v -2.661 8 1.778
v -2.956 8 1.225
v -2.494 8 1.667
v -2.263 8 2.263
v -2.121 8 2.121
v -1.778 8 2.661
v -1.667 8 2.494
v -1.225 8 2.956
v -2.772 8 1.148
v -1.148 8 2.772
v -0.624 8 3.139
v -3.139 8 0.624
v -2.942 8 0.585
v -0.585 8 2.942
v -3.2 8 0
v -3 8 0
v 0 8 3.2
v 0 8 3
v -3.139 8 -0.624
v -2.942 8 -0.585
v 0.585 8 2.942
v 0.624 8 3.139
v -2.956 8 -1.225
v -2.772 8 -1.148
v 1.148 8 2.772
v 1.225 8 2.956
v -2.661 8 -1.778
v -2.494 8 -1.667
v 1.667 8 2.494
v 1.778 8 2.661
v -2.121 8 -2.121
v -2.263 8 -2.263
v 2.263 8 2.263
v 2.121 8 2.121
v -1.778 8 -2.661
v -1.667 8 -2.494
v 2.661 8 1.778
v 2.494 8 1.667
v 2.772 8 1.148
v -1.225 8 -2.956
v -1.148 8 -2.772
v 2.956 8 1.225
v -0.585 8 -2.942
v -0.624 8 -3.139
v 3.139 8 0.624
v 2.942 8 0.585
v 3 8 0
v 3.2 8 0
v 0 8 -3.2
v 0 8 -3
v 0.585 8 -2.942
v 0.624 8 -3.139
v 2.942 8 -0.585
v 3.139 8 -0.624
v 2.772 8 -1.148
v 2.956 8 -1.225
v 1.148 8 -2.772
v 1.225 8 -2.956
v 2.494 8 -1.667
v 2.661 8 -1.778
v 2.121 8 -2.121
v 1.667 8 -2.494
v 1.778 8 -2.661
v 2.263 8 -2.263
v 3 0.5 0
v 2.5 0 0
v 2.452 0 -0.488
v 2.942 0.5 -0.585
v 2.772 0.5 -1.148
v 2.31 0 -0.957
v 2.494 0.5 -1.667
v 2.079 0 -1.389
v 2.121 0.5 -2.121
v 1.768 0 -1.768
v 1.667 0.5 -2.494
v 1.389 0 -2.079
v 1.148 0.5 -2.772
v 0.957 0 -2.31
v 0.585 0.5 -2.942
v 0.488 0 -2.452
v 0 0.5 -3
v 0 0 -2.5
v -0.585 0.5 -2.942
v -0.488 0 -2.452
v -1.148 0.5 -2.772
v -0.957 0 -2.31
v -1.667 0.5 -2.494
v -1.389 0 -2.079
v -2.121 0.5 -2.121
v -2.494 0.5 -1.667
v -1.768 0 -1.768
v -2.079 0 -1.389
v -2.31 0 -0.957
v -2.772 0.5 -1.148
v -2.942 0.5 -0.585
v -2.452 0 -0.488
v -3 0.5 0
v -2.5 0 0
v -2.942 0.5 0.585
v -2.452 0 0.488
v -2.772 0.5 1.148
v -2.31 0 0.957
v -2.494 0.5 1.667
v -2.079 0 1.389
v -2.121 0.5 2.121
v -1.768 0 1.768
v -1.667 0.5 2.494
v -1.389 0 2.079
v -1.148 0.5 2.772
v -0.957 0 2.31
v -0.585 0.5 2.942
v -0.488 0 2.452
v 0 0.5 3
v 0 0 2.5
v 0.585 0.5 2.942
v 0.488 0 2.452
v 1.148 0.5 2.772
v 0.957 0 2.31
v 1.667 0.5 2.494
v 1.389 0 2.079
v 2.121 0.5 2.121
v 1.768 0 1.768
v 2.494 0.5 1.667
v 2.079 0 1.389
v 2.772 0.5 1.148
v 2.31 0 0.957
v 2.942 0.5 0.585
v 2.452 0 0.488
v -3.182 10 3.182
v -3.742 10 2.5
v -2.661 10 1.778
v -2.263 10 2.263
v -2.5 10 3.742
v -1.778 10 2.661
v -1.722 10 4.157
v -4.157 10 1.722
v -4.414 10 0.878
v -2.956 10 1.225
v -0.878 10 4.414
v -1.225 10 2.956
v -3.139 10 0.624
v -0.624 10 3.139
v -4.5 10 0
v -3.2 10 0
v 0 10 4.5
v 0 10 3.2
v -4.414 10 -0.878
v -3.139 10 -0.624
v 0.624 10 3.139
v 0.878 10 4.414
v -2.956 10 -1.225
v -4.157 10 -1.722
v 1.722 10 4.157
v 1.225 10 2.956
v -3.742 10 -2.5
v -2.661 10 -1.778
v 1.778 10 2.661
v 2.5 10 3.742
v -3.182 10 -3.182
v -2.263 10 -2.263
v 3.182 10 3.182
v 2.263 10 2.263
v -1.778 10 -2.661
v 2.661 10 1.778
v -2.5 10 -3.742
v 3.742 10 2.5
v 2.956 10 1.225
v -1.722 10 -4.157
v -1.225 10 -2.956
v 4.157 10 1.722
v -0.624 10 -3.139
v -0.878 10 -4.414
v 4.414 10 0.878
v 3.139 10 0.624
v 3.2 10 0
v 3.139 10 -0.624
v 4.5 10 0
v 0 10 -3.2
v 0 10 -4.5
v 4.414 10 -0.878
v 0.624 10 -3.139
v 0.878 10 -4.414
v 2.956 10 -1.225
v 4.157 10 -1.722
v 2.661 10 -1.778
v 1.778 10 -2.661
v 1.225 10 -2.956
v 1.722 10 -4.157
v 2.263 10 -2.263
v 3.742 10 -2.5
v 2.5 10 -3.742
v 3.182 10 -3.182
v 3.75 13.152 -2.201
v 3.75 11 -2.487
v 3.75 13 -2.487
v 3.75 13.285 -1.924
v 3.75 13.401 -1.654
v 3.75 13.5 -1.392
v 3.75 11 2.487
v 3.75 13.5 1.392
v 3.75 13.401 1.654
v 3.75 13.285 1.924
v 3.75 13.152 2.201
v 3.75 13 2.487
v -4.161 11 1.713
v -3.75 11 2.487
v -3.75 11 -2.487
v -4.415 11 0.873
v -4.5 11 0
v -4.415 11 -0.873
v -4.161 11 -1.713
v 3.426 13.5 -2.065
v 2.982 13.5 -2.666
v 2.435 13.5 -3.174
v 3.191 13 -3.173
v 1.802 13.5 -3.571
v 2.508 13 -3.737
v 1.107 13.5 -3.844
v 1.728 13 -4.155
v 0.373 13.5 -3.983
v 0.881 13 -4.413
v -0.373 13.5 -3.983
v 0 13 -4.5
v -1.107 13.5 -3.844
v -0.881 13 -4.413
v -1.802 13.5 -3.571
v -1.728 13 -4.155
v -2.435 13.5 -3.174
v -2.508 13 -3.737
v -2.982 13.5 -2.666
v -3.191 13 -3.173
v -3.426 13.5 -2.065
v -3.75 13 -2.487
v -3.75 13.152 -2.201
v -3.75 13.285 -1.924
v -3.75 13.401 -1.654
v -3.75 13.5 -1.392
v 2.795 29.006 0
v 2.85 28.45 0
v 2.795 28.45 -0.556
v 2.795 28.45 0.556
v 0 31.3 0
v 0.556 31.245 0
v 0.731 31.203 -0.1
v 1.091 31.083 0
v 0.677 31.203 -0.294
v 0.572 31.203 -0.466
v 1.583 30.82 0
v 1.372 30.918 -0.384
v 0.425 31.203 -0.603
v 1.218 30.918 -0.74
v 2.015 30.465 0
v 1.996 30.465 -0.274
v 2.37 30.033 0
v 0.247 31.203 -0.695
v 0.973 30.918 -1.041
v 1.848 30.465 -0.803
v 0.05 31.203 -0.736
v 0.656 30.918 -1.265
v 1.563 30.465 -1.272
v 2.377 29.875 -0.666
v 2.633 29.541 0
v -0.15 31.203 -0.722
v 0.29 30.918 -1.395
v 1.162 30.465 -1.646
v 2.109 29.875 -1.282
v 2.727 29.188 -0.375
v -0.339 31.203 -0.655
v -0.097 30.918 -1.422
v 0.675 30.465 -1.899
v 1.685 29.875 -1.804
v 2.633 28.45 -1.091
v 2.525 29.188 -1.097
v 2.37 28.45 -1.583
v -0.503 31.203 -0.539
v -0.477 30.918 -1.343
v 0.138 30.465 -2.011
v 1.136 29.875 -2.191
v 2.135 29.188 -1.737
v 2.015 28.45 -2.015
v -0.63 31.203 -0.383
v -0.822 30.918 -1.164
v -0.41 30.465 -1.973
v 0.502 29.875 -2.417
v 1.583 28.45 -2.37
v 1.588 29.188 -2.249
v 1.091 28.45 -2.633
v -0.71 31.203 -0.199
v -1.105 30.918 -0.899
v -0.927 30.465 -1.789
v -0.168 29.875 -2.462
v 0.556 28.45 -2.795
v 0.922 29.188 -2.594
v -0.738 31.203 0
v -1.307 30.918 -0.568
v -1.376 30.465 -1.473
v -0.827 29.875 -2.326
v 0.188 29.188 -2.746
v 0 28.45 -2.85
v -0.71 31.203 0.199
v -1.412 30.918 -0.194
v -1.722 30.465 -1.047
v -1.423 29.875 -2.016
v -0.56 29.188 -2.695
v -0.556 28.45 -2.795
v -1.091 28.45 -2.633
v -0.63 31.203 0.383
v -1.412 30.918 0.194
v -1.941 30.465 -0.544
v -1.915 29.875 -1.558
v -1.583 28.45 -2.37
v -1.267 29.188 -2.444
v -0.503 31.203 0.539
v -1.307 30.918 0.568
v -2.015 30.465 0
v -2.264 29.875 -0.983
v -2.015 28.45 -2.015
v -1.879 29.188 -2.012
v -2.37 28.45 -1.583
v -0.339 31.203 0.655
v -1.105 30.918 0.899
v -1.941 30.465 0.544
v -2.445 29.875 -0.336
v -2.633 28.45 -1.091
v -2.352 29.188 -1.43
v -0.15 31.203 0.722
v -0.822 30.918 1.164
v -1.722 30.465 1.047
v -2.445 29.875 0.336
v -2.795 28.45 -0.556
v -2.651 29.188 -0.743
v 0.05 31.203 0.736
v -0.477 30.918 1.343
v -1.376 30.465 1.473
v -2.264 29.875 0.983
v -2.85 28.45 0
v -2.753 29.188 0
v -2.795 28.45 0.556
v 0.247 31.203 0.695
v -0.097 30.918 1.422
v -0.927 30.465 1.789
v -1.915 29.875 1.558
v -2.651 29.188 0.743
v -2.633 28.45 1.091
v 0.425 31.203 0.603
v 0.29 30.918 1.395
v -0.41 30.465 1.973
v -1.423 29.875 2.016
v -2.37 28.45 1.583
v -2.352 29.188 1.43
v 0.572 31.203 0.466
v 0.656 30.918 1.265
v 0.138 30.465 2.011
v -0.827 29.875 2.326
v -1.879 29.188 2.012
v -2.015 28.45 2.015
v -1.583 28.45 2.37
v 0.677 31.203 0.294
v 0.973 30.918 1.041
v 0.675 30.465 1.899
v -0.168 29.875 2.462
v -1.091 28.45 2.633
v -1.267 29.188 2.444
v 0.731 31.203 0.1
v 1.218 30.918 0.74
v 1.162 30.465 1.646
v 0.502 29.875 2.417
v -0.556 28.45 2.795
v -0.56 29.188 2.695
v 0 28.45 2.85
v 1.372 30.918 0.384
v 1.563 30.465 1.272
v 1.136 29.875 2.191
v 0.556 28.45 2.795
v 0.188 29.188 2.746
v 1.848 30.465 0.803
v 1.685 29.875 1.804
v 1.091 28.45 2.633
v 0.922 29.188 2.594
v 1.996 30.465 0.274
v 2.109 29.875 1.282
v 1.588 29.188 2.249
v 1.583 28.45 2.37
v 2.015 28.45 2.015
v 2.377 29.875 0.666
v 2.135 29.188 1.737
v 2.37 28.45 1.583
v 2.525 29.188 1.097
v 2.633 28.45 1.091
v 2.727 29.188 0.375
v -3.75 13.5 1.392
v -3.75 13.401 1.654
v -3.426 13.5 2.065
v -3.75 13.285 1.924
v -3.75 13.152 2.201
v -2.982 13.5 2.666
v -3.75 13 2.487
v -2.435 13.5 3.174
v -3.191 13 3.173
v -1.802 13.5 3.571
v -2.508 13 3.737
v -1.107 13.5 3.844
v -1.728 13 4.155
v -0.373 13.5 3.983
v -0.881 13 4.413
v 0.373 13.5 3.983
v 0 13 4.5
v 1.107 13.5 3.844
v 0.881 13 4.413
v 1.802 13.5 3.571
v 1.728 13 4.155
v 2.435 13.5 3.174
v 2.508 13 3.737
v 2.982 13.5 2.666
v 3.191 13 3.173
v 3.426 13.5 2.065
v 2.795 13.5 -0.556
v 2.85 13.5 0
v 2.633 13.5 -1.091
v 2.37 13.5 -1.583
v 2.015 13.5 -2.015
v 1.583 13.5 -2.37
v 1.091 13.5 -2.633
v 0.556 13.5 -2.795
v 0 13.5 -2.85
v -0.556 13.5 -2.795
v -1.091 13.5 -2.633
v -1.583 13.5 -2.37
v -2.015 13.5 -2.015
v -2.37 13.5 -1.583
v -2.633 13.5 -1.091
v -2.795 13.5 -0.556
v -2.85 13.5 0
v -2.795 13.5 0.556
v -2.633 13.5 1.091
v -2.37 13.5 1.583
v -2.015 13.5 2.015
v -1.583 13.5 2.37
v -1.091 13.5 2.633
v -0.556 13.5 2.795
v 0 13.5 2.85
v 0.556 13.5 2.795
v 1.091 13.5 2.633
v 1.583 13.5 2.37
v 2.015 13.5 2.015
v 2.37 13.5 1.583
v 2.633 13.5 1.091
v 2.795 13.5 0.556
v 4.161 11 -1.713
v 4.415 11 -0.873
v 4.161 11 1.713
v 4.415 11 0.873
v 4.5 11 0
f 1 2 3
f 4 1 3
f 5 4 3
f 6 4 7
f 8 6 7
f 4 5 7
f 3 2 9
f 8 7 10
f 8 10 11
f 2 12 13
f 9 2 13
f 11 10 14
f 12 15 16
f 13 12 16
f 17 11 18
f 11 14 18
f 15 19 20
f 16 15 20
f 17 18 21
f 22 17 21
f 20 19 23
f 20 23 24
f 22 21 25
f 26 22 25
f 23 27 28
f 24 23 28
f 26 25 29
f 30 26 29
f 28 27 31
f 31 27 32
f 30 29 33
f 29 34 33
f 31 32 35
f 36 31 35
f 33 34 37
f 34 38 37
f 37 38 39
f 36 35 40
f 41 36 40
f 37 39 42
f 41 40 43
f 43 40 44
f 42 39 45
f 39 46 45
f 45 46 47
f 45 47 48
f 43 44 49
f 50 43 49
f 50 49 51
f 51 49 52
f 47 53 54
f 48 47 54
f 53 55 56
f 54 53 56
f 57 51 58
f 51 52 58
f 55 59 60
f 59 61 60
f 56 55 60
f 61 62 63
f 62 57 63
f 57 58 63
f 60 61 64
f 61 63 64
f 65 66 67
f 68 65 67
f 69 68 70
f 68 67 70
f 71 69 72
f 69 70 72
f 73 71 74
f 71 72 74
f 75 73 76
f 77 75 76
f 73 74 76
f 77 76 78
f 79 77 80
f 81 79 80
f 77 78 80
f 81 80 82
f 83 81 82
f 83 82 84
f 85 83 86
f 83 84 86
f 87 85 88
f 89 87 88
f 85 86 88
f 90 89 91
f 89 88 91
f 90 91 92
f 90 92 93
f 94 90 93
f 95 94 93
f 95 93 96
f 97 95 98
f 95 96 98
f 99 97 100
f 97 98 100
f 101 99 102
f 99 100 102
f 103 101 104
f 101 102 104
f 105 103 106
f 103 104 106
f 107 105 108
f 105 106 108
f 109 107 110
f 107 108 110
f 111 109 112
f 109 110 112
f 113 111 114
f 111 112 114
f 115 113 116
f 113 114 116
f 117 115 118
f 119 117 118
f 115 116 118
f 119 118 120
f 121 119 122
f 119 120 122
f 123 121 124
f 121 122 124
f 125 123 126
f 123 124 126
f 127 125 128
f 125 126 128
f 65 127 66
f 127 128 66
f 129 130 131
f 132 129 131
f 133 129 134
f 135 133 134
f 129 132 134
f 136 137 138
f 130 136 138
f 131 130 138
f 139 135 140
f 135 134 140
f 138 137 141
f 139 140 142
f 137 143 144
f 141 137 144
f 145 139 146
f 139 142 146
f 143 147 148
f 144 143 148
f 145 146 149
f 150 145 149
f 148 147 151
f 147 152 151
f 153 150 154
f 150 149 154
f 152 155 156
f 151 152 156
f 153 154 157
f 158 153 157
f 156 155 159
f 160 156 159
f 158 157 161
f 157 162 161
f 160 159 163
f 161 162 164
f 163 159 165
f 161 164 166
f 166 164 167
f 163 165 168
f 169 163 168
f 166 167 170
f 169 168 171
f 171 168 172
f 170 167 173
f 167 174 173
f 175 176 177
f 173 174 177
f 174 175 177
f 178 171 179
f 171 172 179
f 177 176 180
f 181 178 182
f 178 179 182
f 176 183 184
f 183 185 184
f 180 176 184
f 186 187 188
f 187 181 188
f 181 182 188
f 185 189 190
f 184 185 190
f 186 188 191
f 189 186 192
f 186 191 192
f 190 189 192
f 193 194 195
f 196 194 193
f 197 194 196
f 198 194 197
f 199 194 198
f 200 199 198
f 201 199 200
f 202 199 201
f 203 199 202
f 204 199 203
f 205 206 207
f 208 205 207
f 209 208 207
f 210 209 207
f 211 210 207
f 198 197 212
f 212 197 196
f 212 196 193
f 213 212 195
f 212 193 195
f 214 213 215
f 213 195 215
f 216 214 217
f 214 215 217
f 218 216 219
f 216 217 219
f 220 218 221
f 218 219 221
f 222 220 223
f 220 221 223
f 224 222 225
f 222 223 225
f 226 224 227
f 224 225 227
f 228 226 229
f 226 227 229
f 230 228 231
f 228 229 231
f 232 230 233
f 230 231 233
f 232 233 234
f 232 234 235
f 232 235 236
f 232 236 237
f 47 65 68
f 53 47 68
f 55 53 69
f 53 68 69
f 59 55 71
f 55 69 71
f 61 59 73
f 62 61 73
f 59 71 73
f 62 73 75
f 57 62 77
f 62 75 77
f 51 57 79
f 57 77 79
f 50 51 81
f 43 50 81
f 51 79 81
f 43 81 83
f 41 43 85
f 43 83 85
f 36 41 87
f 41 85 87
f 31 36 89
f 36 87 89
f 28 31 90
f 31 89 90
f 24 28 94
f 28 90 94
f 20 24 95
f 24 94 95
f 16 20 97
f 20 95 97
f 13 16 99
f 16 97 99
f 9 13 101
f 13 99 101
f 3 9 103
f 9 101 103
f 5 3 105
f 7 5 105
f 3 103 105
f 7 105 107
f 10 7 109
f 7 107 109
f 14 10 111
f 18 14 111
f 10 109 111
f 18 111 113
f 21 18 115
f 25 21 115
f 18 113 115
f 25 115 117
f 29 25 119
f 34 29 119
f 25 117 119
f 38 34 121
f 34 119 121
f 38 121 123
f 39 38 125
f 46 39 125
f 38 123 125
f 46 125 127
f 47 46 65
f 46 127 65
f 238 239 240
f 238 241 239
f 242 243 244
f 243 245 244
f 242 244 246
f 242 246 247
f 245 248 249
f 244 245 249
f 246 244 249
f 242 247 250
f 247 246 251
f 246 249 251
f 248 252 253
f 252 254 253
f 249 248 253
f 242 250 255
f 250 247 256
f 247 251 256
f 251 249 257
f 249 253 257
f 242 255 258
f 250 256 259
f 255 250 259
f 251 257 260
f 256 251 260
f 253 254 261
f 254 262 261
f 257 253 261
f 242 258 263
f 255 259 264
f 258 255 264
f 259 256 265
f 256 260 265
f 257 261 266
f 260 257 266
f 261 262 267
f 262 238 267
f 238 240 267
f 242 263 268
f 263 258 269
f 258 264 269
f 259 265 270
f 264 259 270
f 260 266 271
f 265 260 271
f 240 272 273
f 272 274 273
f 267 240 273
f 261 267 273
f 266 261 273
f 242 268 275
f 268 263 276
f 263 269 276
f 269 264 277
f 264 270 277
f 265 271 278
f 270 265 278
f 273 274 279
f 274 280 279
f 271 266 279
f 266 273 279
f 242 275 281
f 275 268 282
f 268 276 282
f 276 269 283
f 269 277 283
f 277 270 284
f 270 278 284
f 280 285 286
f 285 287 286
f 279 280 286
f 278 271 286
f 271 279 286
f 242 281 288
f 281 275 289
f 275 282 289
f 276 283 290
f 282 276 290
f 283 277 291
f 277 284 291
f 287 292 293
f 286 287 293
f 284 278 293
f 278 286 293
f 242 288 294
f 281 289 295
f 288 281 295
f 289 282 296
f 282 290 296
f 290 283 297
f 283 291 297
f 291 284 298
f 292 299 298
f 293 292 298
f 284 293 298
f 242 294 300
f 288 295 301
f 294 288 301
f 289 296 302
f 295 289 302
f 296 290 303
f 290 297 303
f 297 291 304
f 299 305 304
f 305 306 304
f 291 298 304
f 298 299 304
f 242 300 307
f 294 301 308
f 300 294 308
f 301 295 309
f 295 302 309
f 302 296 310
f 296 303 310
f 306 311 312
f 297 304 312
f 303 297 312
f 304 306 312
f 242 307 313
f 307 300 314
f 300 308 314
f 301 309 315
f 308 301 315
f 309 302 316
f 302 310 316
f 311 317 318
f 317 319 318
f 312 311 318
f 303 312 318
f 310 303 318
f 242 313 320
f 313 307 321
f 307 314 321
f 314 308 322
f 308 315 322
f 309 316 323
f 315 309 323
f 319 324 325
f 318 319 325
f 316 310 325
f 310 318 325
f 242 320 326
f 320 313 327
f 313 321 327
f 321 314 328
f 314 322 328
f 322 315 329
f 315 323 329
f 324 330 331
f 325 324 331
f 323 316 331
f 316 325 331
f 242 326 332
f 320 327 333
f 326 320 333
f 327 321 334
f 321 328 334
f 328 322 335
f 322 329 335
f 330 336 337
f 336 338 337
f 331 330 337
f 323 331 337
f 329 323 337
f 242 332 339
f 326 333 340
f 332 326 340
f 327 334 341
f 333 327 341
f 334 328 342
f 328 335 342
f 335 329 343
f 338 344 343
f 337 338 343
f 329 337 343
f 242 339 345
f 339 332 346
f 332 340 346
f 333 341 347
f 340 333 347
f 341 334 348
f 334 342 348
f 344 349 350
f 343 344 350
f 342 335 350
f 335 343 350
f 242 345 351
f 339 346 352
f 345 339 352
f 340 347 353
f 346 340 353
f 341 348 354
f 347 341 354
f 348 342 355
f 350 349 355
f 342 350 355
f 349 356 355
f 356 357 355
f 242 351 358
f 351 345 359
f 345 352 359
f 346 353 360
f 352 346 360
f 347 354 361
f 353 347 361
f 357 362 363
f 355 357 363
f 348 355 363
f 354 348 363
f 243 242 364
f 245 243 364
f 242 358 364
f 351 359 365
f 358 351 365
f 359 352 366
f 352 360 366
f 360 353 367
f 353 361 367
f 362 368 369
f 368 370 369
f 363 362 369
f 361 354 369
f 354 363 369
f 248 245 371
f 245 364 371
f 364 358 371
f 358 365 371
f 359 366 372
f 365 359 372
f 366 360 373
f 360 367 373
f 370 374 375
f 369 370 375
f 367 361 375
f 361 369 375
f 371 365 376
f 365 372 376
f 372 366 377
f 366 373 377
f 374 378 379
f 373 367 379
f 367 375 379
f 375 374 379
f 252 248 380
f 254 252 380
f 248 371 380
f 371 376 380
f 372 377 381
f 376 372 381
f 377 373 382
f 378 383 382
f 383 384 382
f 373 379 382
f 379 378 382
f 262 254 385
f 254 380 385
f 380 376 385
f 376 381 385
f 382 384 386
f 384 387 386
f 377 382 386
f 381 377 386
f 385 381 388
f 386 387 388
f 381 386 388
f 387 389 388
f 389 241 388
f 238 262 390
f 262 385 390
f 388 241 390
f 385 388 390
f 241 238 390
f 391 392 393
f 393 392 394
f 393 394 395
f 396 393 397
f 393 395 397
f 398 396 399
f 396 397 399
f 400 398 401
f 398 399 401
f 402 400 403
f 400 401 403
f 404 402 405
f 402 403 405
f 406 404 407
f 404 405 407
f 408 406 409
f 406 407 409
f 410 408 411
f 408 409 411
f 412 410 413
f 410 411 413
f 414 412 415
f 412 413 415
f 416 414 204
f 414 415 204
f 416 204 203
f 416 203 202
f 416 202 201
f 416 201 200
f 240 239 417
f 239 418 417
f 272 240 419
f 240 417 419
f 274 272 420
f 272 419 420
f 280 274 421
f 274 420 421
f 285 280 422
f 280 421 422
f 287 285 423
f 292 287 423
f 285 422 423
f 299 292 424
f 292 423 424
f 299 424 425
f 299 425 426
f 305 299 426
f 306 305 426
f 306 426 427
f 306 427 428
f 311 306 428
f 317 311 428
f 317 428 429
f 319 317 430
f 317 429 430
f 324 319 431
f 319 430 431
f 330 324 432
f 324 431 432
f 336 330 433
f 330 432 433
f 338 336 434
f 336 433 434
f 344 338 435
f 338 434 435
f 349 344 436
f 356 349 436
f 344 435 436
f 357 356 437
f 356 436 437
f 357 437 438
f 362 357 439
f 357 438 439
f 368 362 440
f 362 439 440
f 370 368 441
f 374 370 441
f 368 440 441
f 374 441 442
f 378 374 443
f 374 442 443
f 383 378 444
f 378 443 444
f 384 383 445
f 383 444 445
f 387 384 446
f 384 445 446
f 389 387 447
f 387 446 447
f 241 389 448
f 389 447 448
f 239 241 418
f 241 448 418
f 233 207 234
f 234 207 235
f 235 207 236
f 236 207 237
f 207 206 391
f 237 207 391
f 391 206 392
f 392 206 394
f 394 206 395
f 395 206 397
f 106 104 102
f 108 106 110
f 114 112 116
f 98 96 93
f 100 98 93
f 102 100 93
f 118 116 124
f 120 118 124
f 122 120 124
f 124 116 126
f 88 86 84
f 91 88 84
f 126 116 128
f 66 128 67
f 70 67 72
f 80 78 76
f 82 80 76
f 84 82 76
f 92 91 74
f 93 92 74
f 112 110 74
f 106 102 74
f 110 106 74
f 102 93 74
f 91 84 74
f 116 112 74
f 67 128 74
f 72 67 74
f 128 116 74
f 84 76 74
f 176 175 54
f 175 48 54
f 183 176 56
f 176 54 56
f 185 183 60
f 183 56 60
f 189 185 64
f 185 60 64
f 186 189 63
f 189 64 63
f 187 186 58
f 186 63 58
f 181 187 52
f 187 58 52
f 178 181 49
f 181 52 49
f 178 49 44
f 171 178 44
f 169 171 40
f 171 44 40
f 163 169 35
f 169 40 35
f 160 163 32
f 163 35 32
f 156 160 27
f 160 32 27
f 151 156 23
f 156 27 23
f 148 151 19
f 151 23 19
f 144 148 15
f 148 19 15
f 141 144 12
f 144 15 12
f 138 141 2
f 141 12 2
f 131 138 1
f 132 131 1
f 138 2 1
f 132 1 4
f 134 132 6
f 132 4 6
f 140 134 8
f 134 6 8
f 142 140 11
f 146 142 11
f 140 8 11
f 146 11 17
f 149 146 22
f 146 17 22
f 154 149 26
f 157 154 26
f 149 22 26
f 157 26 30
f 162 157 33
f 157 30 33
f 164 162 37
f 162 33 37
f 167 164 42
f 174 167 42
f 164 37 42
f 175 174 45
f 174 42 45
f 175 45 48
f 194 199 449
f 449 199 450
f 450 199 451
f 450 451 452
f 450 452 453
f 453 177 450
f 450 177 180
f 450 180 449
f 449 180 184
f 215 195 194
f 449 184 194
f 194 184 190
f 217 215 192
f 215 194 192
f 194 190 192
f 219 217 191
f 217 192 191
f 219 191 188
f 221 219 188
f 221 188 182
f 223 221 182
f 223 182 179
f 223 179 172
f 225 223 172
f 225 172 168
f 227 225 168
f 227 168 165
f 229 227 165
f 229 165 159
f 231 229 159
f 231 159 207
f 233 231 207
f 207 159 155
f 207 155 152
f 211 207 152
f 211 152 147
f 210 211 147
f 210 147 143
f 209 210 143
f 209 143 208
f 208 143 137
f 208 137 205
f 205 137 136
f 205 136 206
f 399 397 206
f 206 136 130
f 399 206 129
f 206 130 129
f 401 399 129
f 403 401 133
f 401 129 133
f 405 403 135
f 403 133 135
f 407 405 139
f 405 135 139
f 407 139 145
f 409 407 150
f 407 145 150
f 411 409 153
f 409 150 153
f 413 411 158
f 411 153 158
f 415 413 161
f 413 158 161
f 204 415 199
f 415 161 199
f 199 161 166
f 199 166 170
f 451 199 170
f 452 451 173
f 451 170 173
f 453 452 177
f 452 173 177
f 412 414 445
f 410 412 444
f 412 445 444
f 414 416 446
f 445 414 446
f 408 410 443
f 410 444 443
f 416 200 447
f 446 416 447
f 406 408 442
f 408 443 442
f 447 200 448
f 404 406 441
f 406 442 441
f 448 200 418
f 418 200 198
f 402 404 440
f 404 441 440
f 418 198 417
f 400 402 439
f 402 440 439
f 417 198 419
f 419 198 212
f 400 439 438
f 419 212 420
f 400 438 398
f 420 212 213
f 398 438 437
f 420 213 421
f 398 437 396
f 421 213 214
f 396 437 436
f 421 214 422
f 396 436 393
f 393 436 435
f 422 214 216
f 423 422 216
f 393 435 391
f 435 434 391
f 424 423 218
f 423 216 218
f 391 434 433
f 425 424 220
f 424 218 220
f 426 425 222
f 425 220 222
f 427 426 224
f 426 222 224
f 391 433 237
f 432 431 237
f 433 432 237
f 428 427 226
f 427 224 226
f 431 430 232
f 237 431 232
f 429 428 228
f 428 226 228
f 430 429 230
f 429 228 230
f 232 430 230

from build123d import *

# Parameters (mm, degrees)
SKETCH3_W          = 2
SKETCH3_H          = 3
CUT_EXTRUDE1_DEPTH = 32.940413272
CHAMFER1_SIZE      = 0.5


with BuildPart() as part:
    # Sketch2 → Revolve1 (revolve)
    with BuildSketch(Plane.XY):
        with BuildLine():
            Line((0, 0), (0, 31.3))
            ThreePointArc((0, 31.3), (2.015254326, 30.465254326), (2.85, 28.45))
            Line((2.85, 28.45), (2.85, 13.5))
            Line((2.85, 13.5), (4, 13.5))
            Line((4, 13.5), (4.5, 13))
            Line((4.5, 13), (4.5, 10))
            Line((4.5, 10), (3.2, 10))
            Line((3.2, 10), (3.2, 8))
            Line((3.2, 8), (3, 8))
            Line((3, 8), (3, 0))
            Line((3, 0), (0, 0))
        make_face()
    revolve(axis=Axis((0, 0, 0), (0, 1, 0)))

    # Sketch3 → Cut-Extrude1 (cut, symmetric)
    with BuildSketch(Plane.XY):
        with Locations((-4.75, 12.5)):
            Rectangle(SKETCH3_W, SKETCH3_H)
    cut_extrude1 = extrude(amount=CUT_EXTRUDE1_DEPTH, both=True, mode=Mode.SUBTRACT)

    # Mirror1: Cut-Extrude1 across plane
    add(cut_extrude1.mirror(Plane(origin=(0, 0, 0), x_dir=(0, 0, 1), z_dir=(1, 0, 0))), mode=Mode.SUBTRACT)

    # Chamfer1
    chamfer1_edges = [part.edges().sort_by_distance(p)[0] for p in [
        (-3, 0, 0),
    ]]
    chamfer(chamfer1_edges, length=CHAMFER1_SIZE)


solid = part.part
